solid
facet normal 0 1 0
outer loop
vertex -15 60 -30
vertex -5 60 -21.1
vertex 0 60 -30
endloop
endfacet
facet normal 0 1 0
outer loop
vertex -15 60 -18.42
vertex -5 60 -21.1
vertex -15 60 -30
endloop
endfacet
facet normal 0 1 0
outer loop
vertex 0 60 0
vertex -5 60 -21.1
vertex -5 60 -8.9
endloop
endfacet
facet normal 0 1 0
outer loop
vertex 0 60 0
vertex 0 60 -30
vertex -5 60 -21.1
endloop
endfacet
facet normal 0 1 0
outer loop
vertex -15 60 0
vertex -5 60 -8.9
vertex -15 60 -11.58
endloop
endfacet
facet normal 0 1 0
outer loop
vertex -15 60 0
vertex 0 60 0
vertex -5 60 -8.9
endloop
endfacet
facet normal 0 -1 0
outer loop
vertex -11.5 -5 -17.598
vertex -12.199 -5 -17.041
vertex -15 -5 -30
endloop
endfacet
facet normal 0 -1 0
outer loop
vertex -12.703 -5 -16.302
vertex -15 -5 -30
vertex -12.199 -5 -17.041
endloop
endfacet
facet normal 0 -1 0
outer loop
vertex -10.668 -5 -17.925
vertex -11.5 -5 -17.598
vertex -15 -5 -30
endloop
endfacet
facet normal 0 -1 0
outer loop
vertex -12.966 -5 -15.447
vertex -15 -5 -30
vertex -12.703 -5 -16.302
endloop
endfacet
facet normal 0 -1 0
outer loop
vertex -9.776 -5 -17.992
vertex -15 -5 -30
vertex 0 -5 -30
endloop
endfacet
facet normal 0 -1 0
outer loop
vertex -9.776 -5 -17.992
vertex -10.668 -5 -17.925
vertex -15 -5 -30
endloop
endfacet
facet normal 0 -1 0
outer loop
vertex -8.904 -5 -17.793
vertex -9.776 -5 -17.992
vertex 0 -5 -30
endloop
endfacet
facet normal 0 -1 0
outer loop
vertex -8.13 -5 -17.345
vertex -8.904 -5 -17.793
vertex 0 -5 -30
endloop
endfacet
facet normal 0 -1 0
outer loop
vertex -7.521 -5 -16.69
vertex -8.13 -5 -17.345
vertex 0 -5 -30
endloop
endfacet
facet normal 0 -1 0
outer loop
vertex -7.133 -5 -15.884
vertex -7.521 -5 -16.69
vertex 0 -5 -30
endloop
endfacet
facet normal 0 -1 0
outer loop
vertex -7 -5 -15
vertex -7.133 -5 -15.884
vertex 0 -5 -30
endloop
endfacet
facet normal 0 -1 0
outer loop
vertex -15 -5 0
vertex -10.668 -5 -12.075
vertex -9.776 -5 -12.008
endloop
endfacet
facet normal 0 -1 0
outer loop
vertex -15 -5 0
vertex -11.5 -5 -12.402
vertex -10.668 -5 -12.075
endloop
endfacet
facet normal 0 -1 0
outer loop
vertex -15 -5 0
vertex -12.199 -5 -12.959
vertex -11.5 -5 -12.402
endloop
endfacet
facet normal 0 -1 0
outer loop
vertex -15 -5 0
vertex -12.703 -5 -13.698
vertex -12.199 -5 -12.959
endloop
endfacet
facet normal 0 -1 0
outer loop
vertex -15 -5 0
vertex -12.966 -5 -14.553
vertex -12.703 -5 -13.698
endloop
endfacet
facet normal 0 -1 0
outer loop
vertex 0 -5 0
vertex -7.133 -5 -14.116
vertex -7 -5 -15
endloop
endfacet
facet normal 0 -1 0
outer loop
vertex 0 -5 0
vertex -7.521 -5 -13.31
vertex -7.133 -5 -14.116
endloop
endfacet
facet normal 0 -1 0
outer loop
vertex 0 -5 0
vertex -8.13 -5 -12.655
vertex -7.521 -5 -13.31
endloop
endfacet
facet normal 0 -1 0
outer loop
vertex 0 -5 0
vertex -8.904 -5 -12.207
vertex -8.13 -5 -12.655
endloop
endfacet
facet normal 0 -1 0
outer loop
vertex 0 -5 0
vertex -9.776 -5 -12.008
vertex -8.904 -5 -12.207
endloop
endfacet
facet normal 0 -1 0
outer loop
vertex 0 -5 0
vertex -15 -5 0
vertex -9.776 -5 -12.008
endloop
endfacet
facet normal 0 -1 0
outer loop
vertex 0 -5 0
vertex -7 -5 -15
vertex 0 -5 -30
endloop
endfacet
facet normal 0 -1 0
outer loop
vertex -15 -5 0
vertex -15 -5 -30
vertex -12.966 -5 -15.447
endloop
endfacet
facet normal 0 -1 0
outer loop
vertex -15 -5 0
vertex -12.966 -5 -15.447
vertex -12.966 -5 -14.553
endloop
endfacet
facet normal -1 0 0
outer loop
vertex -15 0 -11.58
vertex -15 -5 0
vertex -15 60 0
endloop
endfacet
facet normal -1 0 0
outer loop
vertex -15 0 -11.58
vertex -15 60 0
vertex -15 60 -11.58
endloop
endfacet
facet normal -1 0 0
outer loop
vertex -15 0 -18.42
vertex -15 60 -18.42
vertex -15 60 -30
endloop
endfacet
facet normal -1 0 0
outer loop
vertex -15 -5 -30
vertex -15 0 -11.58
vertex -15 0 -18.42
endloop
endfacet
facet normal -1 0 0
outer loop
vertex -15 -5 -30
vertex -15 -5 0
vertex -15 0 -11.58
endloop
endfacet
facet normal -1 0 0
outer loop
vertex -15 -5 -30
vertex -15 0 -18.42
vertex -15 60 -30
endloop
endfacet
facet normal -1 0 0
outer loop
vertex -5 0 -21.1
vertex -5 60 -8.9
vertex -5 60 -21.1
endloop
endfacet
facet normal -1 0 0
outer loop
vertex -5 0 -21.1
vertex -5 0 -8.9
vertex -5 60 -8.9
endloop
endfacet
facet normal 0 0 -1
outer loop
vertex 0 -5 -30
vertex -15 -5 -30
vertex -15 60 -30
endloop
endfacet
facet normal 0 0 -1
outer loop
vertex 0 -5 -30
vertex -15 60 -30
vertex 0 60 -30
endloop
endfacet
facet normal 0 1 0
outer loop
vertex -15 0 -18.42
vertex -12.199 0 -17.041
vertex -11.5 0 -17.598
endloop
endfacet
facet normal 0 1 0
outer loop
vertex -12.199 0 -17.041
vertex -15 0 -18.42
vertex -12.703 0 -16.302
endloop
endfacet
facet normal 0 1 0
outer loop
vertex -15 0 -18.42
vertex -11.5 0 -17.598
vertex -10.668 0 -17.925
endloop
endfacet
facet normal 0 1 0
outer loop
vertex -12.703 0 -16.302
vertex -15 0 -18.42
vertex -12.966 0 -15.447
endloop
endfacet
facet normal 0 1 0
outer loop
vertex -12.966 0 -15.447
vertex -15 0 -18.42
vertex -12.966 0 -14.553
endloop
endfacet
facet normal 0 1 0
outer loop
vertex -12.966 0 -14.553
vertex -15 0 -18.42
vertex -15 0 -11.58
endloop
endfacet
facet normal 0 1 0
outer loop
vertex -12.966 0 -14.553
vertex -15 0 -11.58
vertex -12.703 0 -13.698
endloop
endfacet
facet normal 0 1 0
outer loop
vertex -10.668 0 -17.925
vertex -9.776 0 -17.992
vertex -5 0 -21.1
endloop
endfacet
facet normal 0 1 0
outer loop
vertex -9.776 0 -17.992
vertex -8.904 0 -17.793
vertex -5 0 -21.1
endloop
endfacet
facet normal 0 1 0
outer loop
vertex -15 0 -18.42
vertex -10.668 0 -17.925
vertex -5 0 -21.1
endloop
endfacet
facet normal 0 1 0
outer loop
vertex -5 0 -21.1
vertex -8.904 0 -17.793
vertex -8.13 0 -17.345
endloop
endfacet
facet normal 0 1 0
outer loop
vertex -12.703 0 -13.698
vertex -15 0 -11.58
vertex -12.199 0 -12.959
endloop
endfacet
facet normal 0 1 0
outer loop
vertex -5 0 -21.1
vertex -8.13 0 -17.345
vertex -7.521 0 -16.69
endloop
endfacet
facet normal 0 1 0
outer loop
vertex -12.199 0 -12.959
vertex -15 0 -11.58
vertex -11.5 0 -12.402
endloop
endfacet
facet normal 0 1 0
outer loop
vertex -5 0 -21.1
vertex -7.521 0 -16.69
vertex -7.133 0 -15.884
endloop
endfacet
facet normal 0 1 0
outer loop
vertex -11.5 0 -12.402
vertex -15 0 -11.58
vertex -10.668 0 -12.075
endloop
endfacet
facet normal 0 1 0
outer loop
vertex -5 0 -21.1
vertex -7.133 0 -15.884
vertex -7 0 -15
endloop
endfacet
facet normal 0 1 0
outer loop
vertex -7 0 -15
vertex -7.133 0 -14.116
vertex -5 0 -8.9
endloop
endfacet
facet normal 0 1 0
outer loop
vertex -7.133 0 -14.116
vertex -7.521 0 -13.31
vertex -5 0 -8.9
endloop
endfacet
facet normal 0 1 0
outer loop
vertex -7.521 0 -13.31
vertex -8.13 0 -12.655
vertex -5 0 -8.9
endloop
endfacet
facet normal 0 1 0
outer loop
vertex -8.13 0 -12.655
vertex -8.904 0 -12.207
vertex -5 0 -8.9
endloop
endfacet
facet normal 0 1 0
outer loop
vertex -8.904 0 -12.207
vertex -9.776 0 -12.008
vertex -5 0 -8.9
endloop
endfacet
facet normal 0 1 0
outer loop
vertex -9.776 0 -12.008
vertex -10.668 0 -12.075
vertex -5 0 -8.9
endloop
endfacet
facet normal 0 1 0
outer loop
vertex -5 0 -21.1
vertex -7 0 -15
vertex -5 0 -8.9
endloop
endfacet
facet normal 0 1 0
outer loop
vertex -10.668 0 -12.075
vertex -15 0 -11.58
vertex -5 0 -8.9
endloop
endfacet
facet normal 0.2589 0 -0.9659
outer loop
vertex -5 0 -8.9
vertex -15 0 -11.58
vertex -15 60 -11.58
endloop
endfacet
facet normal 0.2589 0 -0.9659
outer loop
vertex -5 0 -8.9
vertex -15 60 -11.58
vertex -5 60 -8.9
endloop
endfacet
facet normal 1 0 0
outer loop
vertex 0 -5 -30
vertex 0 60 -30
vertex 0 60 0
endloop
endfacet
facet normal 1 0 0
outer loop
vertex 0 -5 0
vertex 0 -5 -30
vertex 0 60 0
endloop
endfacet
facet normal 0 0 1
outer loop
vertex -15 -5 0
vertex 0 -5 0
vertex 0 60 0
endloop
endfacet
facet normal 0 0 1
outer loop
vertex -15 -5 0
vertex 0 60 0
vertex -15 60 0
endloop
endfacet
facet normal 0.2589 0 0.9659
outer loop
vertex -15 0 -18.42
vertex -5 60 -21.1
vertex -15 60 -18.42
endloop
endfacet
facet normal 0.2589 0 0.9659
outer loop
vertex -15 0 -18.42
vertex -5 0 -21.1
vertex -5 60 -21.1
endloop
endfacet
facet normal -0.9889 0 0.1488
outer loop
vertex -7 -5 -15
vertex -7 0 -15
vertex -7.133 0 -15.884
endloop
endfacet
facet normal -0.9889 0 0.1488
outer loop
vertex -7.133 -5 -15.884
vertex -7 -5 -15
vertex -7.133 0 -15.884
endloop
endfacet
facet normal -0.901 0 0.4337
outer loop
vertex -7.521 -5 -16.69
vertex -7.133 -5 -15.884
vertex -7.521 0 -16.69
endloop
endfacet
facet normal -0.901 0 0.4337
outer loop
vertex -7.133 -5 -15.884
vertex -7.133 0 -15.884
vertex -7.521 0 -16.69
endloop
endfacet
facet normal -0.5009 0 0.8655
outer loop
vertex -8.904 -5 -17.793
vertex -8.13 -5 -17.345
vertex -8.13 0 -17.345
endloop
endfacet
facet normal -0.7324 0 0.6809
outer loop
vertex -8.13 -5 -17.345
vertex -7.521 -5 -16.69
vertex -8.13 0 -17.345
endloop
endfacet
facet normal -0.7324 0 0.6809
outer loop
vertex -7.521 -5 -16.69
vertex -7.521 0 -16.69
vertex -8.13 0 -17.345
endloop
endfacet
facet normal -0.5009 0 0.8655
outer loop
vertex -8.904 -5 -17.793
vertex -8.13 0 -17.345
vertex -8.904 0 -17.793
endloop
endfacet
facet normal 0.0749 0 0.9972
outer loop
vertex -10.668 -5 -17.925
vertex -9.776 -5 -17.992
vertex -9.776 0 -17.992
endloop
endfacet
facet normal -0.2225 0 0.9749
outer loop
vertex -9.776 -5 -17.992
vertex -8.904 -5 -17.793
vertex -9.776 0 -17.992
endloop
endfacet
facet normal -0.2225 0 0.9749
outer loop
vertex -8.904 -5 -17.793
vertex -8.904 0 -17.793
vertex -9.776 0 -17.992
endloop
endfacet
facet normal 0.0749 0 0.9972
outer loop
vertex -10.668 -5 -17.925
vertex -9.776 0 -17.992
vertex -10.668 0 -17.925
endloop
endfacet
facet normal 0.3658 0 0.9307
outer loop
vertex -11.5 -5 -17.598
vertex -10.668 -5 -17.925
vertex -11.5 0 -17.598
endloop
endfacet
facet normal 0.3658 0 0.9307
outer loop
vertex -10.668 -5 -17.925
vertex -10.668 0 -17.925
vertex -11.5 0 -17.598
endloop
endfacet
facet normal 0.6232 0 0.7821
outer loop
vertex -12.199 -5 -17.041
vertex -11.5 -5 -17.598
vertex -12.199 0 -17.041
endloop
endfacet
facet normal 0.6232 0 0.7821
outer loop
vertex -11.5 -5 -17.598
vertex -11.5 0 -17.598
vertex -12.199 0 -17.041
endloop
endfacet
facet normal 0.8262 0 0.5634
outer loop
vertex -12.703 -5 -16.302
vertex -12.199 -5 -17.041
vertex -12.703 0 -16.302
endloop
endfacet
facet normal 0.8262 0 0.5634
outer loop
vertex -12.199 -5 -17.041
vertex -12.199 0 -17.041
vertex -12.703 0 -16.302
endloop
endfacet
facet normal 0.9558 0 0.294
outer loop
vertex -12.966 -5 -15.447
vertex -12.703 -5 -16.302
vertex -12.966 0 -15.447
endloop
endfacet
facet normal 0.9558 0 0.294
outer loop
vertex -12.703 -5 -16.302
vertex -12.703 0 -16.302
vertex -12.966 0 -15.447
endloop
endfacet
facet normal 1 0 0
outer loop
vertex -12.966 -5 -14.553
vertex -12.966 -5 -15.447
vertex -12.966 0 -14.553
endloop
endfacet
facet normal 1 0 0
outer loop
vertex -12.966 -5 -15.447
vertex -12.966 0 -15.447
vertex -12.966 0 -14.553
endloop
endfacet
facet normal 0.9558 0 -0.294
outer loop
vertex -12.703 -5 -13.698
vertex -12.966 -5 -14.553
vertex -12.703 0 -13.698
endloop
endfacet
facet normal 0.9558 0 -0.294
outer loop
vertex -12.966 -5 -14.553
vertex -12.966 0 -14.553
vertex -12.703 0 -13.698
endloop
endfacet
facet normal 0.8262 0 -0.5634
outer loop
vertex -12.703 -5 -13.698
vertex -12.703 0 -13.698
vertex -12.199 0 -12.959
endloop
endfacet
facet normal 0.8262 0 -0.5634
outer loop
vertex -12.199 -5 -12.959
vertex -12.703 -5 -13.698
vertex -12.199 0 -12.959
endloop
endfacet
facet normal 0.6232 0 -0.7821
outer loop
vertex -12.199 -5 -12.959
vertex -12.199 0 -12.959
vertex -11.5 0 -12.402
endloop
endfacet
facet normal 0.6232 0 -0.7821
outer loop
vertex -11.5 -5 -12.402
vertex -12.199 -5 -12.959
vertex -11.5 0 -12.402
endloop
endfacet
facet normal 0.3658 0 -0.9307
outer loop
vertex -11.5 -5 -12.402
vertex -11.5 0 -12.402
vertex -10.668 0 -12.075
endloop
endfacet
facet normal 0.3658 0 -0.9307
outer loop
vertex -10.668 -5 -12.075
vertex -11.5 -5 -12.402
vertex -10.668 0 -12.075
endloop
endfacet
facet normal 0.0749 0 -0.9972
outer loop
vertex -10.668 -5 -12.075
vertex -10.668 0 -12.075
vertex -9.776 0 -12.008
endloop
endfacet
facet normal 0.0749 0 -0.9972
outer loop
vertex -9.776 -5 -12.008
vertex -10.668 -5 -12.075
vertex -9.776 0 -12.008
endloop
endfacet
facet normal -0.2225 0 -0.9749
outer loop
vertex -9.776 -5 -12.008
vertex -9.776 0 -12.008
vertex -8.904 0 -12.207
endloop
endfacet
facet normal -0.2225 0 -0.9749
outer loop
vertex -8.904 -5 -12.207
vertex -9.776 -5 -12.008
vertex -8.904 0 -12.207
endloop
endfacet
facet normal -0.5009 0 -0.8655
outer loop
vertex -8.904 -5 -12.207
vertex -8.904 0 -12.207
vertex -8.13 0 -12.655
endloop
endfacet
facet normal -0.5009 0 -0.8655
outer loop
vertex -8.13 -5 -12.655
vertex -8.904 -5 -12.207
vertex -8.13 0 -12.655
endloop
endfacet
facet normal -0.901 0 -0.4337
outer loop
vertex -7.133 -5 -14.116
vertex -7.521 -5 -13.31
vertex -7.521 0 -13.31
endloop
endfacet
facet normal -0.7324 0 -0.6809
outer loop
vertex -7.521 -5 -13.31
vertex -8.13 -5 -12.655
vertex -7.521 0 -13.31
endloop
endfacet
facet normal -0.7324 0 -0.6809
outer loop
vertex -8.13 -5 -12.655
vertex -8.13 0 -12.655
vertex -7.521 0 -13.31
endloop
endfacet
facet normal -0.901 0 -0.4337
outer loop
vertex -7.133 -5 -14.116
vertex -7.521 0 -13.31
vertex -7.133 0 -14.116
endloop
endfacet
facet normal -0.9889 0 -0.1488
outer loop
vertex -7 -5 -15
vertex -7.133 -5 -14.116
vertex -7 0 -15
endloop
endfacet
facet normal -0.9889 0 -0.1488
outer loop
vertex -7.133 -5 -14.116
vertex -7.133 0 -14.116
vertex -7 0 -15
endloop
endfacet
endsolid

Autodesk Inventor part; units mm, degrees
ref_plane "YZ Plane" through (0, 0, 0) normal (1, 0, 0) x (0, 1, 0)
ref_plane "XZ Plane" through (0, 0, 0) normal (0, 1, 0) x (-1, 0, 0)
ref_plane "XY Plane" through (0, 0, 0) normal (0, 0, 1) x (1, 0, 0)
sketch "Sketch1" plane through (0, 0, 0) normal (0, 1, 0) x (-1, 0, 0)
  line L0 (0, 0) -> (15, 0)
  line L1 (15, 0) -> (15, -11.5795)
  line L2 (15, -11.5795) -> (5, -8.9)
  line L3 (5, -8.9) -> (5, -21.1)
  line L4 (5, -21.1) -> (15, -18.4205)
  line L5 (15, -18.4205) -> (15, -30)
  line L6 (15, -30) -> (0, -30)
  line L7 (0, -30) -> (0, 0)
  point P0 (5, -15)
  dimension "d0" = 12.2
  dimension "d1" = 30
  dimension "d2" = 15
  dimension "d3" = 10
  dimension "d4" = 30
extrude "Extrusion1" add sketch "Sketch1" along normal blind 60
sketch "Sketch2" plane through (0, 0, 0) normal (0, -1, 0) x (1, 0, 0)
  line L0 (0, -30) -> (-15, -30) projected
  line L1 (0, 0) -> (0, -30) projected
  line L2 (-15, 0) -> (0, 0) projected
  line L3 (-15, -11.5795) -> (-15, 0) projected
  line L4 (-5, -8.9) -> (-15, -11.5795) projected
  line L5 (-5, -21.1) -> (-5, -8.9) projected
  line L6 (-15, -18.4205) -> (-5, -21.1) projected
  line L7 (-15, -30) -> (-15, -18.4205) projected
  line L8 (-15, -18.4205) -> (-15, -11.5795)
  circle A0 centre (-10, -15) radius 3
  point P0 (-15, -15)
  point P1 (-10, -19.7603)
  dimension "d9" = 6
extrude "Extrusion2" add sketch "Sketch2" along normal blind 5
properties part number "Laser_Base"
